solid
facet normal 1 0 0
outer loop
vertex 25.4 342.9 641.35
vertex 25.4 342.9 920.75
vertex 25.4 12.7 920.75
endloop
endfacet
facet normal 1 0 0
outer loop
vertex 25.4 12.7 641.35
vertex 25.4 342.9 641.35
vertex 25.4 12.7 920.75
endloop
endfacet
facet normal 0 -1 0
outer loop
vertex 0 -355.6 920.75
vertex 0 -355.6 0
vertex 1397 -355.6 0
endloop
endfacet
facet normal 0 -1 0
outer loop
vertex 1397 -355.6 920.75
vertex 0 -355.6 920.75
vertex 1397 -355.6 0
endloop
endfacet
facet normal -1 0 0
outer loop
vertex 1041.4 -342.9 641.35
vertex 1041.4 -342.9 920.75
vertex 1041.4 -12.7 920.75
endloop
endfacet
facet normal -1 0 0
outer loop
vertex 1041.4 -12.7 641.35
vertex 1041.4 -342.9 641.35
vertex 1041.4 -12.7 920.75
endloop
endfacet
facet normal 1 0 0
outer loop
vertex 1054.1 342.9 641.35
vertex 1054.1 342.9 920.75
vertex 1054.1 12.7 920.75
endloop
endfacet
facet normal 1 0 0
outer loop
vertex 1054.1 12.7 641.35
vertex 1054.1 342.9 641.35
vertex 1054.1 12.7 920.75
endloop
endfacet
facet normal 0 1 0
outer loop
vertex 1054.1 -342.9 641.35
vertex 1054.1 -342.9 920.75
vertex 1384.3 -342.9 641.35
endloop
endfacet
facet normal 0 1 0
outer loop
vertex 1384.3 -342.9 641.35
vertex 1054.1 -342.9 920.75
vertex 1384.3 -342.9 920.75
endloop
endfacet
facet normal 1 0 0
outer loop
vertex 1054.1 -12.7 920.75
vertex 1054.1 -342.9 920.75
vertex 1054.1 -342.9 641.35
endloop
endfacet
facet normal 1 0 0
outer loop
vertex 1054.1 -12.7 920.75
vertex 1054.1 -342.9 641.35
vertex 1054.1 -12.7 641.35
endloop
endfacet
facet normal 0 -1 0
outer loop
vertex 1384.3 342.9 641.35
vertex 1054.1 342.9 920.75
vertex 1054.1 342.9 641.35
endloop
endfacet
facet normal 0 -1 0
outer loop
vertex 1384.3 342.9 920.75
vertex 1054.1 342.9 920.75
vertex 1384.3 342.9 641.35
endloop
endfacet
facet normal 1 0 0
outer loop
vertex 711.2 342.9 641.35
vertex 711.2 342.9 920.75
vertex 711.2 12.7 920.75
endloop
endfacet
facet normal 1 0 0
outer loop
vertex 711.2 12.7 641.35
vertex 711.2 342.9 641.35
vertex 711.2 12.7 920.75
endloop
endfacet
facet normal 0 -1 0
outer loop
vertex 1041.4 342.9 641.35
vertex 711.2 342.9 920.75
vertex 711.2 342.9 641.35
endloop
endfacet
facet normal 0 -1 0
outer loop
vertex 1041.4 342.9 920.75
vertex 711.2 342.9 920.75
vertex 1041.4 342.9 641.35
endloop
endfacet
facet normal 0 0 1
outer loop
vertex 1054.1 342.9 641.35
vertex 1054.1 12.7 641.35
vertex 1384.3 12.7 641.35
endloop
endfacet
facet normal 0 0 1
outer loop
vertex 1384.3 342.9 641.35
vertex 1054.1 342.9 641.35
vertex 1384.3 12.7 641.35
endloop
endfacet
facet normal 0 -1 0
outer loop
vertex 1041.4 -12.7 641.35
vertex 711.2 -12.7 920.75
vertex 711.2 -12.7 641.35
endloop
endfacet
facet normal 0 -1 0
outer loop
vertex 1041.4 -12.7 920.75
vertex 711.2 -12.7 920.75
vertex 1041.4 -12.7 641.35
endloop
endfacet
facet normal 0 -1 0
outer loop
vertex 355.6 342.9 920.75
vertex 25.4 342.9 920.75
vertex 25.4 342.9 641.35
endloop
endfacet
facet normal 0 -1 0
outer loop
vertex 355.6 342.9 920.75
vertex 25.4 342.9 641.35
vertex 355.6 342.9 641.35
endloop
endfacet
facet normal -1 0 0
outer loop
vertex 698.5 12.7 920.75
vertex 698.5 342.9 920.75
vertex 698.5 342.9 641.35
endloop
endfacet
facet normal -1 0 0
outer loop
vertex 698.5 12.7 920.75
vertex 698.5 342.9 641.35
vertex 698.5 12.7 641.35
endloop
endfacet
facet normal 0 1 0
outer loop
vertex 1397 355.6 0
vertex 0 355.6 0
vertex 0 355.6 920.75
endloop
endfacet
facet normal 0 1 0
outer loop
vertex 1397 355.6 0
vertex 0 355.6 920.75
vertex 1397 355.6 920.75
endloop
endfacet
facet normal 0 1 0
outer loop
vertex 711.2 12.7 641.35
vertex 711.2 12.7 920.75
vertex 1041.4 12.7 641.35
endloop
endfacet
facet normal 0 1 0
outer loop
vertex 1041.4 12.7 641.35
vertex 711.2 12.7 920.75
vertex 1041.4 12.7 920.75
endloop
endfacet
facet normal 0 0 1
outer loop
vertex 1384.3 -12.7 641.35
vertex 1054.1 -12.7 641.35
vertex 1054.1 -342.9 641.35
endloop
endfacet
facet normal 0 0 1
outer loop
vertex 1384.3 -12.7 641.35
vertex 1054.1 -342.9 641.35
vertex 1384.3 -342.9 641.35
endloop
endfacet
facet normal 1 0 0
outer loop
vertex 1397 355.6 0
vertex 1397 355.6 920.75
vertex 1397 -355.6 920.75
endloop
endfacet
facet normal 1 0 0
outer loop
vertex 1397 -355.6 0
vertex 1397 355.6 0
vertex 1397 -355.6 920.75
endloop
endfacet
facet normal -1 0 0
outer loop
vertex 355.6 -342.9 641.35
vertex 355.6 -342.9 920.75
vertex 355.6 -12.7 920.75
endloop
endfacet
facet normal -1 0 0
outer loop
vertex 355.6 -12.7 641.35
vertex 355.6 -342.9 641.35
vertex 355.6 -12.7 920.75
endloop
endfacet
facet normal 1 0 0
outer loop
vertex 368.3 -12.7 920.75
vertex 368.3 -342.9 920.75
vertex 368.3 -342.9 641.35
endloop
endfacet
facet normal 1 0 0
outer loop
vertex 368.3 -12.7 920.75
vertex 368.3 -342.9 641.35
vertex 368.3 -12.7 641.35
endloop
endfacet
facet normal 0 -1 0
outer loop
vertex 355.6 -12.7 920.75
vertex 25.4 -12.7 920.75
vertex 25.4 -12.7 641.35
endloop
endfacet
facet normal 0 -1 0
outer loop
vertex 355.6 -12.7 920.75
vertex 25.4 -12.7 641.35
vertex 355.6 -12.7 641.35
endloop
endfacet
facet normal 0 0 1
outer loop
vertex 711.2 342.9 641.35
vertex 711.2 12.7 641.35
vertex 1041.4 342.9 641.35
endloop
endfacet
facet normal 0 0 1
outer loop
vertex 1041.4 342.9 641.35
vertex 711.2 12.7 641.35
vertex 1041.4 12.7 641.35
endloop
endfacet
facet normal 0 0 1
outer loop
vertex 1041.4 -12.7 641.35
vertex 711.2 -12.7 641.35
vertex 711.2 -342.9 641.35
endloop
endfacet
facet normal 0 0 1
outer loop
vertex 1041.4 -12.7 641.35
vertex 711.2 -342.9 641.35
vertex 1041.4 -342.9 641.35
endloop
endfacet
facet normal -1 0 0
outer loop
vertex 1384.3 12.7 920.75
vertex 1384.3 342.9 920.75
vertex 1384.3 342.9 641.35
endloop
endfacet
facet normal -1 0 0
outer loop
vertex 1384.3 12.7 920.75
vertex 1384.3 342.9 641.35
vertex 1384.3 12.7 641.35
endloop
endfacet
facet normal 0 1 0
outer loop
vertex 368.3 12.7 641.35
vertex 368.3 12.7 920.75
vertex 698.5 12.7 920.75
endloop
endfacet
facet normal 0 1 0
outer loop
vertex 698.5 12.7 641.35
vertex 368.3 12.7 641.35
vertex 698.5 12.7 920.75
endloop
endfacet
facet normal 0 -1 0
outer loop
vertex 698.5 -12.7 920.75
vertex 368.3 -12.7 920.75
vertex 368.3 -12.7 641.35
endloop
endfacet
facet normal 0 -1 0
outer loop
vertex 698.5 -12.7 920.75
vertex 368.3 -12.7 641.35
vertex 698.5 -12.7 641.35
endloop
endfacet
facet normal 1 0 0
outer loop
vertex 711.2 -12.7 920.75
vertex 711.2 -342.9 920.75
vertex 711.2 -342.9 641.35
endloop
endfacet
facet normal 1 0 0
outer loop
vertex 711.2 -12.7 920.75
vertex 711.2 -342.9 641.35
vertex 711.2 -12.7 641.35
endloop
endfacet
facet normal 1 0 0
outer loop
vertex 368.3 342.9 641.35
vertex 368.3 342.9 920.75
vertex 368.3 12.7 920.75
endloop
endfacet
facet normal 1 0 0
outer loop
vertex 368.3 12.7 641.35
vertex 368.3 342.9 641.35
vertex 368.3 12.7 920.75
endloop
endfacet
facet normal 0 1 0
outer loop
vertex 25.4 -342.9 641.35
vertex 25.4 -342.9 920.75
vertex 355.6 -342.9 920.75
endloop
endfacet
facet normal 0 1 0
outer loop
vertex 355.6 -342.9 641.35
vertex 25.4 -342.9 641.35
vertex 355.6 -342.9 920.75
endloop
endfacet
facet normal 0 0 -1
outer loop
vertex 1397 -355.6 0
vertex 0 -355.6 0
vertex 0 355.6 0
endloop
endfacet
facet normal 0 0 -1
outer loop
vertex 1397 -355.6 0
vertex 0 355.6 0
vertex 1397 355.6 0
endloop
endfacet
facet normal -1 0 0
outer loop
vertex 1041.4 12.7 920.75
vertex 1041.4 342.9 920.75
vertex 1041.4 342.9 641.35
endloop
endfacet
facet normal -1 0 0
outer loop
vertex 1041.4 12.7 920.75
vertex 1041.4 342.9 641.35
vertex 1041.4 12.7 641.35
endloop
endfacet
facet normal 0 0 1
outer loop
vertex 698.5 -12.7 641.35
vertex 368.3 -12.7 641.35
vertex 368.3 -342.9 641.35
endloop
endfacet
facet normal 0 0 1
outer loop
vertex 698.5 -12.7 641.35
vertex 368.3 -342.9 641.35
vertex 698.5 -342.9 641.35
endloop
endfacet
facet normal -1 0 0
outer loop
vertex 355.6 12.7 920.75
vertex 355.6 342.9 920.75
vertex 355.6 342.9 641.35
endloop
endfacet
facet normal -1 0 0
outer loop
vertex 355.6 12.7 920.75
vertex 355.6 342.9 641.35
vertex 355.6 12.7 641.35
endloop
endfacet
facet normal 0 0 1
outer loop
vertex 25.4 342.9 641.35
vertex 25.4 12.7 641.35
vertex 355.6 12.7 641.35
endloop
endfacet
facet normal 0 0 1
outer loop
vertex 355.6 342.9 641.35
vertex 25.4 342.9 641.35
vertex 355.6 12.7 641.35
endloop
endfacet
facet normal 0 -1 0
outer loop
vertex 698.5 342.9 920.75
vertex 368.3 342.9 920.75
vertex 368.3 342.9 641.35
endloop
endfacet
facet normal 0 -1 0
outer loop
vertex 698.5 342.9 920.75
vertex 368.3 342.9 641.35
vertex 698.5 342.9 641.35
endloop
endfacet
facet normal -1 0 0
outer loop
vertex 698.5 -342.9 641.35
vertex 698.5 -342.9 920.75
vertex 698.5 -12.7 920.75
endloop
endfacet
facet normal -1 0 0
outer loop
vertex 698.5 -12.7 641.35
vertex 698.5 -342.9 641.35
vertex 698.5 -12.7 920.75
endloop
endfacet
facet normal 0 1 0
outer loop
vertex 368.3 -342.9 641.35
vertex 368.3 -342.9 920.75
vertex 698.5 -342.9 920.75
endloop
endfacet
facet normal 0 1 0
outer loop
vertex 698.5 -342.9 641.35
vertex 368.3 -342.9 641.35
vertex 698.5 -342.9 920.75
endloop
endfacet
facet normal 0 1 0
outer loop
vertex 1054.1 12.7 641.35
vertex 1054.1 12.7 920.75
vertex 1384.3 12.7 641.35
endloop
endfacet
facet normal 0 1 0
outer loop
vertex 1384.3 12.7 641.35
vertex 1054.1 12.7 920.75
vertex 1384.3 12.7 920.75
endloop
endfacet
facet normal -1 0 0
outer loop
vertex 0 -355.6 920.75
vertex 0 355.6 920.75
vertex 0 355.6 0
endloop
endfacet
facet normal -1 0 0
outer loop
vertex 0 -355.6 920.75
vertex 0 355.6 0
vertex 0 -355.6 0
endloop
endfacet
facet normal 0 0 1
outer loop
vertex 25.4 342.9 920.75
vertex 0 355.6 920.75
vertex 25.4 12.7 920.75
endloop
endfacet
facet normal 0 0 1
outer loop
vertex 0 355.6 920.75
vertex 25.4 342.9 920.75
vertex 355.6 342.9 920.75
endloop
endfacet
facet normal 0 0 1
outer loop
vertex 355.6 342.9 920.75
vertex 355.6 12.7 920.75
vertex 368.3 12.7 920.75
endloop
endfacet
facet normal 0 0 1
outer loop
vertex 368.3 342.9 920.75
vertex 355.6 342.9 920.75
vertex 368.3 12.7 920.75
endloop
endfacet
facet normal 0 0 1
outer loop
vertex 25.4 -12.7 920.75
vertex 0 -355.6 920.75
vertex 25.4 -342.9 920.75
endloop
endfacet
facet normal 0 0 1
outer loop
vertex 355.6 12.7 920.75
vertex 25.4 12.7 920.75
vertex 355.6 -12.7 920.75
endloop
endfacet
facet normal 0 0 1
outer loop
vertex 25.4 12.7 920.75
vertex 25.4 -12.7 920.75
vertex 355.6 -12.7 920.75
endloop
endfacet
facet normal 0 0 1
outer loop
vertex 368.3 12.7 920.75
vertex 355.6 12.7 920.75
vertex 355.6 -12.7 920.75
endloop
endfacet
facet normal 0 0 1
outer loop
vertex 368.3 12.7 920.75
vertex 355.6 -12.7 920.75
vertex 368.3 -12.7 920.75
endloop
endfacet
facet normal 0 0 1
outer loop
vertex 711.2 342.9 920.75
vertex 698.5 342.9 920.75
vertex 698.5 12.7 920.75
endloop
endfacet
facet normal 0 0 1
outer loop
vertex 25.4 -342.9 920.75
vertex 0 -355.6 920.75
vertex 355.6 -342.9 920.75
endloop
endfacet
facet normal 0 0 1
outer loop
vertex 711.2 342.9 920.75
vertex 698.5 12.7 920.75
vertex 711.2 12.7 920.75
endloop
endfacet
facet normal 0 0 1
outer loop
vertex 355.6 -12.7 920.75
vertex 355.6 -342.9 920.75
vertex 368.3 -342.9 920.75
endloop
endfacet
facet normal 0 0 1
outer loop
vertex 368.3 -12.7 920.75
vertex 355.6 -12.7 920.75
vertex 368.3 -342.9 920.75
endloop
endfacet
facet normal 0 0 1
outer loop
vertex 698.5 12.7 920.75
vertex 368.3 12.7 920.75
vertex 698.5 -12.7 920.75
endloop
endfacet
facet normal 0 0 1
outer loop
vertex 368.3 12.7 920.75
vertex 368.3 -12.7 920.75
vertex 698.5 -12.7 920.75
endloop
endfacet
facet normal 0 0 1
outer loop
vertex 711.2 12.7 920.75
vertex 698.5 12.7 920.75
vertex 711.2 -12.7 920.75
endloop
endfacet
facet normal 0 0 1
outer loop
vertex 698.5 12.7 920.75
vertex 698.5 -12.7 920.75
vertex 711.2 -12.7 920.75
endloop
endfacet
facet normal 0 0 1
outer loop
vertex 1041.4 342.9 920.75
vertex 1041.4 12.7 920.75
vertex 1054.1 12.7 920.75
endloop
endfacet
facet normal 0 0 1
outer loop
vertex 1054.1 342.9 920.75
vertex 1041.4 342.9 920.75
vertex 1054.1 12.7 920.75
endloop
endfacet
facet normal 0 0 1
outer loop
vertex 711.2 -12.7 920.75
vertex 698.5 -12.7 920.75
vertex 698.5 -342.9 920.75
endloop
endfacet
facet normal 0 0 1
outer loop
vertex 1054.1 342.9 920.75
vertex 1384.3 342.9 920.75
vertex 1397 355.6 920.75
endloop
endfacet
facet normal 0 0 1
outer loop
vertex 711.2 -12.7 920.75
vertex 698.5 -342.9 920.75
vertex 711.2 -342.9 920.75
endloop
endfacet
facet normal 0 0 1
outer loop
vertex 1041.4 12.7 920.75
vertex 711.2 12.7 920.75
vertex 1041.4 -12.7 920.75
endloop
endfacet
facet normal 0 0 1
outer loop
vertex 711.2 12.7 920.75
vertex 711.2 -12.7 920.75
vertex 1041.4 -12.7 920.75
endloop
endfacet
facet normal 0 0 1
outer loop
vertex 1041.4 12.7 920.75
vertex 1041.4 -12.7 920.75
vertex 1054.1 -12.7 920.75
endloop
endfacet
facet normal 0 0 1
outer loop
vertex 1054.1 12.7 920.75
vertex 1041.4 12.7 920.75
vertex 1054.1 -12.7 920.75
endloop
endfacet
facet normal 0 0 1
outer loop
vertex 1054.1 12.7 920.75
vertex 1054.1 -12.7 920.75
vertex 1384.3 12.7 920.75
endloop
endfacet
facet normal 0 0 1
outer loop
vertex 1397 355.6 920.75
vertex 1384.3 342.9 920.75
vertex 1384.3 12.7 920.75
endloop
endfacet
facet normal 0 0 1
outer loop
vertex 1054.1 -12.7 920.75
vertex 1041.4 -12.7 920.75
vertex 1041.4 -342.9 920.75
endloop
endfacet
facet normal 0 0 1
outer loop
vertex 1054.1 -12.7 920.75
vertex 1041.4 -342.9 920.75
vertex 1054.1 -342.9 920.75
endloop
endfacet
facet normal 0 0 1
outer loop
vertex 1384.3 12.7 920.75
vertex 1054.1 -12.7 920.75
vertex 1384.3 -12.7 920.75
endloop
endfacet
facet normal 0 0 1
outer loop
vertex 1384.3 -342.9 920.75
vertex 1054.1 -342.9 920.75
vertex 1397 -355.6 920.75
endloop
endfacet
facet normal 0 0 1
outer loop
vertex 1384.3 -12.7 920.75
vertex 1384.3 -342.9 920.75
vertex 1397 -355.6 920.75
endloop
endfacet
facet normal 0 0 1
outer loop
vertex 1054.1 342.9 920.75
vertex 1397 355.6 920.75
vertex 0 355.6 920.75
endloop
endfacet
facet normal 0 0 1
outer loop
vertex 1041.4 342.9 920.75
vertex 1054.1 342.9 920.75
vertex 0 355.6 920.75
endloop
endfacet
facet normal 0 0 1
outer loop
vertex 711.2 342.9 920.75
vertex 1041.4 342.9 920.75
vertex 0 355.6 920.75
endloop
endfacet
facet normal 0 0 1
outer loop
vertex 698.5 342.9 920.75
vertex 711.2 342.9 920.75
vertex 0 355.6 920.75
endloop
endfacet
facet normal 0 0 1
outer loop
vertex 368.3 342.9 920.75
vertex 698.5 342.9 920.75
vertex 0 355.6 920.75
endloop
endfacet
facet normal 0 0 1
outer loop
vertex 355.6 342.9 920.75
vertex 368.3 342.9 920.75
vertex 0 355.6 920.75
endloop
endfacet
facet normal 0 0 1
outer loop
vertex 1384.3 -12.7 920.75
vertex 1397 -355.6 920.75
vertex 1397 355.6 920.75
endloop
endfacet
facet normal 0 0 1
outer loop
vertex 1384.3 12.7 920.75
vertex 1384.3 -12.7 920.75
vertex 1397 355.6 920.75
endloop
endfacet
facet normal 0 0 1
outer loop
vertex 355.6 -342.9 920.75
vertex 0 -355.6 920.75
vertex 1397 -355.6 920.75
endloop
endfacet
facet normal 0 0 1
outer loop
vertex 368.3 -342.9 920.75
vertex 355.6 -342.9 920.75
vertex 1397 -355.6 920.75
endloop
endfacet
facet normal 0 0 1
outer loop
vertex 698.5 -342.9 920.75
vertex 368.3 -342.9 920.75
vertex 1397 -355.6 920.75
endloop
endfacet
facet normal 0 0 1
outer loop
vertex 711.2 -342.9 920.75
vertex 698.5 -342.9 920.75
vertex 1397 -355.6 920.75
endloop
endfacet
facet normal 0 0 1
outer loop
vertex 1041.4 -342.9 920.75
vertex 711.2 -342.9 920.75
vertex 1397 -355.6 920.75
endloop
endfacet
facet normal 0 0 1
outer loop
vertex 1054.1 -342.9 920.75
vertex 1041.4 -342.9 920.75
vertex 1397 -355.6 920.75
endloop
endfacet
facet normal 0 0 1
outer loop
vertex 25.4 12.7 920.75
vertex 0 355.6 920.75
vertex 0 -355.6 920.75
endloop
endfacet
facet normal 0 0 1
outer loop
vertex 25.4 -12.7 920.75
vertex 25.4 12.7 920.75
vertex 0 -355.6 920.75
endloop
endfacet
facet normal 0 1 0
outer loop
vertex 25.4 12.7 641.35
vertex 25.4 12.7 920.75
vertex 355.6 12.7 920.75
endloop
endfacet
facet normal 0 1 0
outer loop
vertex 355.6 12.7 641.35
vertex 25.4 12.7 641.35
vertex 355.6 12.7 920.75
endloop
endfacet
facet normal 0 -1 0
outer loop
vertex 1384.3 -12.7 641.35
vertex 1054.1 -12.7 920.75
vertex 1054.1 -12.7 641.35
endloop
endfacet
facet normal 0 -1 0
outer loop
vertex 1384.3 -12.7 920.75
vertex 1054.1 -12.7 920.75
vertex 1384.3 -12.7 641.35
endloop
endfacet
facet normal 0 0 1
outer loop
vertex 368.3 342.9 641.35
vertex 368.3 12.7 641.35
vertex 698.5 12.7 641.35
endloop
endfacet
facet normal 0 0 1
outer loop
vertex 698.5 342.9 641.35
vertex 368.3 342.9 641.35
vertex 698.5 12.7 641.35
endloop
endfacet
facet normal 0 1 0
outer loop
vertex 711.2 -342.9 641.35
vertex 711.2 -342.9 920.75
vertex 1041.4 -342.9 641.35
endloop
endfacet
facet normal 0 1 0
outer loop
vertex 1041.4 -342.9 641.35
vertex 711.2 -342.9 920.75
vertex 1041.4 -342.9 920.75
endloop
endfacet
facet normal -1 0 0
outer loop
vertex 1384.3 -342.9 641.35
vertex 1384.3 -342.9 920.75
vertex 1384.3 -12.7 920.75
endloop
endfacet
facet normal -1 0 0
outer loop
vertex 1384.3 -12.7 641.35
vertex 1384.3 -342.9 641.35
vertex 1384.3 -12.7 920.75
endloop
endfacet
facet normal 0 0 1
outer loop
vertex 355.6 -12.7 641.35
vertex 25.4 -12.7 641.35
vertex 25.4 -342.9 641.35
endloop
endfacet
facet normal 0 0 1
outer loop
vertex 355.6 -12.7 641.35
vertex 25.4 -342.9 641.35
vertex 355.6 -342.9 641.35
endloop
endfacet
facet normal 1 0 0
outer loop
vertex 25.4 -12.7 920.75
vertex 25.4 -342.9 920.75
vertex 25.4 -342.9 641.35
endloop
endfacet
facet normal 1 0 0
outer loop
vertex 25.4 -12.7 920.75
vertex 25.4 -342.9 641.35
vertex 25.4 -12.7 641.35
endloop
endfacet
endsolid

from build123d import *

# Parameters (mm, degrees)
F0_W      = 1397
F0_H      = 355.6
F1_DEPTH  = 920.75
F9_W      = 330.2
F9_H      = 330.2
F10_DEPTH = 279.4
F7_W      = 330.2
F7_H      = 330.2
F11_DEPTH = 279.4
F5_W      = 330.2
F5_H      = 330.2
F12_DEPTH = 279.4
F3_W      = 330.2
F3_H      = 330.2
F13_DEPTH = 279.4


with BuildPart() as f1:
    # F0 (on Top) → F1 (new body)
    with BuildSketch(Plane.XY):
        with Locations((698.5, -177.8)):
            Rectangle(F0_W, F0_H)
    extrude(amount=F1_DEPTH)

    # F9 (on face) → F10 (cut)
    with BuildSketch(Plane.XY.offset(920.75)):
        with Locations((190.5, -177.8)):
            Rectangle(F9_W, F9_H)
    extrude(amount=-F10_DEPTH, mode=Mode.SUBTRACT)

    # F7 (on face) → F11 (cut)
    with BuildSketch(Plane.XY.offset(920.75)):
        with Locations((533.4, -177.8)):
            Rectangle(F7_W, F7_H)
    extrude(amount=-F11_DEPTH, mode=Mode.SUBTRACT)

    # F5 (on face) → F12 (cut)
    with BuildSketch(Plane.XY.offset(920.75)):
        with Locations((876.3, -177.8)):
            Rectangle(F5_W, F5_H)
    extrude(amount=-F12_DEPTH, mode=Mode.SUBTRACT)

    # F3 (on face) → F13 (cut)
    with BuildSketch(Plane.XY.offset(920.75)):
        with Locations((1219.2, -177.8)):
            Rectangle(F3_W, F3_H)
    extrude(amount=-F13_DEPTH, mode=Mode.SUBTRACT)

    # F14: F1 across plane


with BuildPart() as f1_1:
    add(f1.part)
    add(f1.part.mirror(Plane.XZ))


solid = f1_1.part
